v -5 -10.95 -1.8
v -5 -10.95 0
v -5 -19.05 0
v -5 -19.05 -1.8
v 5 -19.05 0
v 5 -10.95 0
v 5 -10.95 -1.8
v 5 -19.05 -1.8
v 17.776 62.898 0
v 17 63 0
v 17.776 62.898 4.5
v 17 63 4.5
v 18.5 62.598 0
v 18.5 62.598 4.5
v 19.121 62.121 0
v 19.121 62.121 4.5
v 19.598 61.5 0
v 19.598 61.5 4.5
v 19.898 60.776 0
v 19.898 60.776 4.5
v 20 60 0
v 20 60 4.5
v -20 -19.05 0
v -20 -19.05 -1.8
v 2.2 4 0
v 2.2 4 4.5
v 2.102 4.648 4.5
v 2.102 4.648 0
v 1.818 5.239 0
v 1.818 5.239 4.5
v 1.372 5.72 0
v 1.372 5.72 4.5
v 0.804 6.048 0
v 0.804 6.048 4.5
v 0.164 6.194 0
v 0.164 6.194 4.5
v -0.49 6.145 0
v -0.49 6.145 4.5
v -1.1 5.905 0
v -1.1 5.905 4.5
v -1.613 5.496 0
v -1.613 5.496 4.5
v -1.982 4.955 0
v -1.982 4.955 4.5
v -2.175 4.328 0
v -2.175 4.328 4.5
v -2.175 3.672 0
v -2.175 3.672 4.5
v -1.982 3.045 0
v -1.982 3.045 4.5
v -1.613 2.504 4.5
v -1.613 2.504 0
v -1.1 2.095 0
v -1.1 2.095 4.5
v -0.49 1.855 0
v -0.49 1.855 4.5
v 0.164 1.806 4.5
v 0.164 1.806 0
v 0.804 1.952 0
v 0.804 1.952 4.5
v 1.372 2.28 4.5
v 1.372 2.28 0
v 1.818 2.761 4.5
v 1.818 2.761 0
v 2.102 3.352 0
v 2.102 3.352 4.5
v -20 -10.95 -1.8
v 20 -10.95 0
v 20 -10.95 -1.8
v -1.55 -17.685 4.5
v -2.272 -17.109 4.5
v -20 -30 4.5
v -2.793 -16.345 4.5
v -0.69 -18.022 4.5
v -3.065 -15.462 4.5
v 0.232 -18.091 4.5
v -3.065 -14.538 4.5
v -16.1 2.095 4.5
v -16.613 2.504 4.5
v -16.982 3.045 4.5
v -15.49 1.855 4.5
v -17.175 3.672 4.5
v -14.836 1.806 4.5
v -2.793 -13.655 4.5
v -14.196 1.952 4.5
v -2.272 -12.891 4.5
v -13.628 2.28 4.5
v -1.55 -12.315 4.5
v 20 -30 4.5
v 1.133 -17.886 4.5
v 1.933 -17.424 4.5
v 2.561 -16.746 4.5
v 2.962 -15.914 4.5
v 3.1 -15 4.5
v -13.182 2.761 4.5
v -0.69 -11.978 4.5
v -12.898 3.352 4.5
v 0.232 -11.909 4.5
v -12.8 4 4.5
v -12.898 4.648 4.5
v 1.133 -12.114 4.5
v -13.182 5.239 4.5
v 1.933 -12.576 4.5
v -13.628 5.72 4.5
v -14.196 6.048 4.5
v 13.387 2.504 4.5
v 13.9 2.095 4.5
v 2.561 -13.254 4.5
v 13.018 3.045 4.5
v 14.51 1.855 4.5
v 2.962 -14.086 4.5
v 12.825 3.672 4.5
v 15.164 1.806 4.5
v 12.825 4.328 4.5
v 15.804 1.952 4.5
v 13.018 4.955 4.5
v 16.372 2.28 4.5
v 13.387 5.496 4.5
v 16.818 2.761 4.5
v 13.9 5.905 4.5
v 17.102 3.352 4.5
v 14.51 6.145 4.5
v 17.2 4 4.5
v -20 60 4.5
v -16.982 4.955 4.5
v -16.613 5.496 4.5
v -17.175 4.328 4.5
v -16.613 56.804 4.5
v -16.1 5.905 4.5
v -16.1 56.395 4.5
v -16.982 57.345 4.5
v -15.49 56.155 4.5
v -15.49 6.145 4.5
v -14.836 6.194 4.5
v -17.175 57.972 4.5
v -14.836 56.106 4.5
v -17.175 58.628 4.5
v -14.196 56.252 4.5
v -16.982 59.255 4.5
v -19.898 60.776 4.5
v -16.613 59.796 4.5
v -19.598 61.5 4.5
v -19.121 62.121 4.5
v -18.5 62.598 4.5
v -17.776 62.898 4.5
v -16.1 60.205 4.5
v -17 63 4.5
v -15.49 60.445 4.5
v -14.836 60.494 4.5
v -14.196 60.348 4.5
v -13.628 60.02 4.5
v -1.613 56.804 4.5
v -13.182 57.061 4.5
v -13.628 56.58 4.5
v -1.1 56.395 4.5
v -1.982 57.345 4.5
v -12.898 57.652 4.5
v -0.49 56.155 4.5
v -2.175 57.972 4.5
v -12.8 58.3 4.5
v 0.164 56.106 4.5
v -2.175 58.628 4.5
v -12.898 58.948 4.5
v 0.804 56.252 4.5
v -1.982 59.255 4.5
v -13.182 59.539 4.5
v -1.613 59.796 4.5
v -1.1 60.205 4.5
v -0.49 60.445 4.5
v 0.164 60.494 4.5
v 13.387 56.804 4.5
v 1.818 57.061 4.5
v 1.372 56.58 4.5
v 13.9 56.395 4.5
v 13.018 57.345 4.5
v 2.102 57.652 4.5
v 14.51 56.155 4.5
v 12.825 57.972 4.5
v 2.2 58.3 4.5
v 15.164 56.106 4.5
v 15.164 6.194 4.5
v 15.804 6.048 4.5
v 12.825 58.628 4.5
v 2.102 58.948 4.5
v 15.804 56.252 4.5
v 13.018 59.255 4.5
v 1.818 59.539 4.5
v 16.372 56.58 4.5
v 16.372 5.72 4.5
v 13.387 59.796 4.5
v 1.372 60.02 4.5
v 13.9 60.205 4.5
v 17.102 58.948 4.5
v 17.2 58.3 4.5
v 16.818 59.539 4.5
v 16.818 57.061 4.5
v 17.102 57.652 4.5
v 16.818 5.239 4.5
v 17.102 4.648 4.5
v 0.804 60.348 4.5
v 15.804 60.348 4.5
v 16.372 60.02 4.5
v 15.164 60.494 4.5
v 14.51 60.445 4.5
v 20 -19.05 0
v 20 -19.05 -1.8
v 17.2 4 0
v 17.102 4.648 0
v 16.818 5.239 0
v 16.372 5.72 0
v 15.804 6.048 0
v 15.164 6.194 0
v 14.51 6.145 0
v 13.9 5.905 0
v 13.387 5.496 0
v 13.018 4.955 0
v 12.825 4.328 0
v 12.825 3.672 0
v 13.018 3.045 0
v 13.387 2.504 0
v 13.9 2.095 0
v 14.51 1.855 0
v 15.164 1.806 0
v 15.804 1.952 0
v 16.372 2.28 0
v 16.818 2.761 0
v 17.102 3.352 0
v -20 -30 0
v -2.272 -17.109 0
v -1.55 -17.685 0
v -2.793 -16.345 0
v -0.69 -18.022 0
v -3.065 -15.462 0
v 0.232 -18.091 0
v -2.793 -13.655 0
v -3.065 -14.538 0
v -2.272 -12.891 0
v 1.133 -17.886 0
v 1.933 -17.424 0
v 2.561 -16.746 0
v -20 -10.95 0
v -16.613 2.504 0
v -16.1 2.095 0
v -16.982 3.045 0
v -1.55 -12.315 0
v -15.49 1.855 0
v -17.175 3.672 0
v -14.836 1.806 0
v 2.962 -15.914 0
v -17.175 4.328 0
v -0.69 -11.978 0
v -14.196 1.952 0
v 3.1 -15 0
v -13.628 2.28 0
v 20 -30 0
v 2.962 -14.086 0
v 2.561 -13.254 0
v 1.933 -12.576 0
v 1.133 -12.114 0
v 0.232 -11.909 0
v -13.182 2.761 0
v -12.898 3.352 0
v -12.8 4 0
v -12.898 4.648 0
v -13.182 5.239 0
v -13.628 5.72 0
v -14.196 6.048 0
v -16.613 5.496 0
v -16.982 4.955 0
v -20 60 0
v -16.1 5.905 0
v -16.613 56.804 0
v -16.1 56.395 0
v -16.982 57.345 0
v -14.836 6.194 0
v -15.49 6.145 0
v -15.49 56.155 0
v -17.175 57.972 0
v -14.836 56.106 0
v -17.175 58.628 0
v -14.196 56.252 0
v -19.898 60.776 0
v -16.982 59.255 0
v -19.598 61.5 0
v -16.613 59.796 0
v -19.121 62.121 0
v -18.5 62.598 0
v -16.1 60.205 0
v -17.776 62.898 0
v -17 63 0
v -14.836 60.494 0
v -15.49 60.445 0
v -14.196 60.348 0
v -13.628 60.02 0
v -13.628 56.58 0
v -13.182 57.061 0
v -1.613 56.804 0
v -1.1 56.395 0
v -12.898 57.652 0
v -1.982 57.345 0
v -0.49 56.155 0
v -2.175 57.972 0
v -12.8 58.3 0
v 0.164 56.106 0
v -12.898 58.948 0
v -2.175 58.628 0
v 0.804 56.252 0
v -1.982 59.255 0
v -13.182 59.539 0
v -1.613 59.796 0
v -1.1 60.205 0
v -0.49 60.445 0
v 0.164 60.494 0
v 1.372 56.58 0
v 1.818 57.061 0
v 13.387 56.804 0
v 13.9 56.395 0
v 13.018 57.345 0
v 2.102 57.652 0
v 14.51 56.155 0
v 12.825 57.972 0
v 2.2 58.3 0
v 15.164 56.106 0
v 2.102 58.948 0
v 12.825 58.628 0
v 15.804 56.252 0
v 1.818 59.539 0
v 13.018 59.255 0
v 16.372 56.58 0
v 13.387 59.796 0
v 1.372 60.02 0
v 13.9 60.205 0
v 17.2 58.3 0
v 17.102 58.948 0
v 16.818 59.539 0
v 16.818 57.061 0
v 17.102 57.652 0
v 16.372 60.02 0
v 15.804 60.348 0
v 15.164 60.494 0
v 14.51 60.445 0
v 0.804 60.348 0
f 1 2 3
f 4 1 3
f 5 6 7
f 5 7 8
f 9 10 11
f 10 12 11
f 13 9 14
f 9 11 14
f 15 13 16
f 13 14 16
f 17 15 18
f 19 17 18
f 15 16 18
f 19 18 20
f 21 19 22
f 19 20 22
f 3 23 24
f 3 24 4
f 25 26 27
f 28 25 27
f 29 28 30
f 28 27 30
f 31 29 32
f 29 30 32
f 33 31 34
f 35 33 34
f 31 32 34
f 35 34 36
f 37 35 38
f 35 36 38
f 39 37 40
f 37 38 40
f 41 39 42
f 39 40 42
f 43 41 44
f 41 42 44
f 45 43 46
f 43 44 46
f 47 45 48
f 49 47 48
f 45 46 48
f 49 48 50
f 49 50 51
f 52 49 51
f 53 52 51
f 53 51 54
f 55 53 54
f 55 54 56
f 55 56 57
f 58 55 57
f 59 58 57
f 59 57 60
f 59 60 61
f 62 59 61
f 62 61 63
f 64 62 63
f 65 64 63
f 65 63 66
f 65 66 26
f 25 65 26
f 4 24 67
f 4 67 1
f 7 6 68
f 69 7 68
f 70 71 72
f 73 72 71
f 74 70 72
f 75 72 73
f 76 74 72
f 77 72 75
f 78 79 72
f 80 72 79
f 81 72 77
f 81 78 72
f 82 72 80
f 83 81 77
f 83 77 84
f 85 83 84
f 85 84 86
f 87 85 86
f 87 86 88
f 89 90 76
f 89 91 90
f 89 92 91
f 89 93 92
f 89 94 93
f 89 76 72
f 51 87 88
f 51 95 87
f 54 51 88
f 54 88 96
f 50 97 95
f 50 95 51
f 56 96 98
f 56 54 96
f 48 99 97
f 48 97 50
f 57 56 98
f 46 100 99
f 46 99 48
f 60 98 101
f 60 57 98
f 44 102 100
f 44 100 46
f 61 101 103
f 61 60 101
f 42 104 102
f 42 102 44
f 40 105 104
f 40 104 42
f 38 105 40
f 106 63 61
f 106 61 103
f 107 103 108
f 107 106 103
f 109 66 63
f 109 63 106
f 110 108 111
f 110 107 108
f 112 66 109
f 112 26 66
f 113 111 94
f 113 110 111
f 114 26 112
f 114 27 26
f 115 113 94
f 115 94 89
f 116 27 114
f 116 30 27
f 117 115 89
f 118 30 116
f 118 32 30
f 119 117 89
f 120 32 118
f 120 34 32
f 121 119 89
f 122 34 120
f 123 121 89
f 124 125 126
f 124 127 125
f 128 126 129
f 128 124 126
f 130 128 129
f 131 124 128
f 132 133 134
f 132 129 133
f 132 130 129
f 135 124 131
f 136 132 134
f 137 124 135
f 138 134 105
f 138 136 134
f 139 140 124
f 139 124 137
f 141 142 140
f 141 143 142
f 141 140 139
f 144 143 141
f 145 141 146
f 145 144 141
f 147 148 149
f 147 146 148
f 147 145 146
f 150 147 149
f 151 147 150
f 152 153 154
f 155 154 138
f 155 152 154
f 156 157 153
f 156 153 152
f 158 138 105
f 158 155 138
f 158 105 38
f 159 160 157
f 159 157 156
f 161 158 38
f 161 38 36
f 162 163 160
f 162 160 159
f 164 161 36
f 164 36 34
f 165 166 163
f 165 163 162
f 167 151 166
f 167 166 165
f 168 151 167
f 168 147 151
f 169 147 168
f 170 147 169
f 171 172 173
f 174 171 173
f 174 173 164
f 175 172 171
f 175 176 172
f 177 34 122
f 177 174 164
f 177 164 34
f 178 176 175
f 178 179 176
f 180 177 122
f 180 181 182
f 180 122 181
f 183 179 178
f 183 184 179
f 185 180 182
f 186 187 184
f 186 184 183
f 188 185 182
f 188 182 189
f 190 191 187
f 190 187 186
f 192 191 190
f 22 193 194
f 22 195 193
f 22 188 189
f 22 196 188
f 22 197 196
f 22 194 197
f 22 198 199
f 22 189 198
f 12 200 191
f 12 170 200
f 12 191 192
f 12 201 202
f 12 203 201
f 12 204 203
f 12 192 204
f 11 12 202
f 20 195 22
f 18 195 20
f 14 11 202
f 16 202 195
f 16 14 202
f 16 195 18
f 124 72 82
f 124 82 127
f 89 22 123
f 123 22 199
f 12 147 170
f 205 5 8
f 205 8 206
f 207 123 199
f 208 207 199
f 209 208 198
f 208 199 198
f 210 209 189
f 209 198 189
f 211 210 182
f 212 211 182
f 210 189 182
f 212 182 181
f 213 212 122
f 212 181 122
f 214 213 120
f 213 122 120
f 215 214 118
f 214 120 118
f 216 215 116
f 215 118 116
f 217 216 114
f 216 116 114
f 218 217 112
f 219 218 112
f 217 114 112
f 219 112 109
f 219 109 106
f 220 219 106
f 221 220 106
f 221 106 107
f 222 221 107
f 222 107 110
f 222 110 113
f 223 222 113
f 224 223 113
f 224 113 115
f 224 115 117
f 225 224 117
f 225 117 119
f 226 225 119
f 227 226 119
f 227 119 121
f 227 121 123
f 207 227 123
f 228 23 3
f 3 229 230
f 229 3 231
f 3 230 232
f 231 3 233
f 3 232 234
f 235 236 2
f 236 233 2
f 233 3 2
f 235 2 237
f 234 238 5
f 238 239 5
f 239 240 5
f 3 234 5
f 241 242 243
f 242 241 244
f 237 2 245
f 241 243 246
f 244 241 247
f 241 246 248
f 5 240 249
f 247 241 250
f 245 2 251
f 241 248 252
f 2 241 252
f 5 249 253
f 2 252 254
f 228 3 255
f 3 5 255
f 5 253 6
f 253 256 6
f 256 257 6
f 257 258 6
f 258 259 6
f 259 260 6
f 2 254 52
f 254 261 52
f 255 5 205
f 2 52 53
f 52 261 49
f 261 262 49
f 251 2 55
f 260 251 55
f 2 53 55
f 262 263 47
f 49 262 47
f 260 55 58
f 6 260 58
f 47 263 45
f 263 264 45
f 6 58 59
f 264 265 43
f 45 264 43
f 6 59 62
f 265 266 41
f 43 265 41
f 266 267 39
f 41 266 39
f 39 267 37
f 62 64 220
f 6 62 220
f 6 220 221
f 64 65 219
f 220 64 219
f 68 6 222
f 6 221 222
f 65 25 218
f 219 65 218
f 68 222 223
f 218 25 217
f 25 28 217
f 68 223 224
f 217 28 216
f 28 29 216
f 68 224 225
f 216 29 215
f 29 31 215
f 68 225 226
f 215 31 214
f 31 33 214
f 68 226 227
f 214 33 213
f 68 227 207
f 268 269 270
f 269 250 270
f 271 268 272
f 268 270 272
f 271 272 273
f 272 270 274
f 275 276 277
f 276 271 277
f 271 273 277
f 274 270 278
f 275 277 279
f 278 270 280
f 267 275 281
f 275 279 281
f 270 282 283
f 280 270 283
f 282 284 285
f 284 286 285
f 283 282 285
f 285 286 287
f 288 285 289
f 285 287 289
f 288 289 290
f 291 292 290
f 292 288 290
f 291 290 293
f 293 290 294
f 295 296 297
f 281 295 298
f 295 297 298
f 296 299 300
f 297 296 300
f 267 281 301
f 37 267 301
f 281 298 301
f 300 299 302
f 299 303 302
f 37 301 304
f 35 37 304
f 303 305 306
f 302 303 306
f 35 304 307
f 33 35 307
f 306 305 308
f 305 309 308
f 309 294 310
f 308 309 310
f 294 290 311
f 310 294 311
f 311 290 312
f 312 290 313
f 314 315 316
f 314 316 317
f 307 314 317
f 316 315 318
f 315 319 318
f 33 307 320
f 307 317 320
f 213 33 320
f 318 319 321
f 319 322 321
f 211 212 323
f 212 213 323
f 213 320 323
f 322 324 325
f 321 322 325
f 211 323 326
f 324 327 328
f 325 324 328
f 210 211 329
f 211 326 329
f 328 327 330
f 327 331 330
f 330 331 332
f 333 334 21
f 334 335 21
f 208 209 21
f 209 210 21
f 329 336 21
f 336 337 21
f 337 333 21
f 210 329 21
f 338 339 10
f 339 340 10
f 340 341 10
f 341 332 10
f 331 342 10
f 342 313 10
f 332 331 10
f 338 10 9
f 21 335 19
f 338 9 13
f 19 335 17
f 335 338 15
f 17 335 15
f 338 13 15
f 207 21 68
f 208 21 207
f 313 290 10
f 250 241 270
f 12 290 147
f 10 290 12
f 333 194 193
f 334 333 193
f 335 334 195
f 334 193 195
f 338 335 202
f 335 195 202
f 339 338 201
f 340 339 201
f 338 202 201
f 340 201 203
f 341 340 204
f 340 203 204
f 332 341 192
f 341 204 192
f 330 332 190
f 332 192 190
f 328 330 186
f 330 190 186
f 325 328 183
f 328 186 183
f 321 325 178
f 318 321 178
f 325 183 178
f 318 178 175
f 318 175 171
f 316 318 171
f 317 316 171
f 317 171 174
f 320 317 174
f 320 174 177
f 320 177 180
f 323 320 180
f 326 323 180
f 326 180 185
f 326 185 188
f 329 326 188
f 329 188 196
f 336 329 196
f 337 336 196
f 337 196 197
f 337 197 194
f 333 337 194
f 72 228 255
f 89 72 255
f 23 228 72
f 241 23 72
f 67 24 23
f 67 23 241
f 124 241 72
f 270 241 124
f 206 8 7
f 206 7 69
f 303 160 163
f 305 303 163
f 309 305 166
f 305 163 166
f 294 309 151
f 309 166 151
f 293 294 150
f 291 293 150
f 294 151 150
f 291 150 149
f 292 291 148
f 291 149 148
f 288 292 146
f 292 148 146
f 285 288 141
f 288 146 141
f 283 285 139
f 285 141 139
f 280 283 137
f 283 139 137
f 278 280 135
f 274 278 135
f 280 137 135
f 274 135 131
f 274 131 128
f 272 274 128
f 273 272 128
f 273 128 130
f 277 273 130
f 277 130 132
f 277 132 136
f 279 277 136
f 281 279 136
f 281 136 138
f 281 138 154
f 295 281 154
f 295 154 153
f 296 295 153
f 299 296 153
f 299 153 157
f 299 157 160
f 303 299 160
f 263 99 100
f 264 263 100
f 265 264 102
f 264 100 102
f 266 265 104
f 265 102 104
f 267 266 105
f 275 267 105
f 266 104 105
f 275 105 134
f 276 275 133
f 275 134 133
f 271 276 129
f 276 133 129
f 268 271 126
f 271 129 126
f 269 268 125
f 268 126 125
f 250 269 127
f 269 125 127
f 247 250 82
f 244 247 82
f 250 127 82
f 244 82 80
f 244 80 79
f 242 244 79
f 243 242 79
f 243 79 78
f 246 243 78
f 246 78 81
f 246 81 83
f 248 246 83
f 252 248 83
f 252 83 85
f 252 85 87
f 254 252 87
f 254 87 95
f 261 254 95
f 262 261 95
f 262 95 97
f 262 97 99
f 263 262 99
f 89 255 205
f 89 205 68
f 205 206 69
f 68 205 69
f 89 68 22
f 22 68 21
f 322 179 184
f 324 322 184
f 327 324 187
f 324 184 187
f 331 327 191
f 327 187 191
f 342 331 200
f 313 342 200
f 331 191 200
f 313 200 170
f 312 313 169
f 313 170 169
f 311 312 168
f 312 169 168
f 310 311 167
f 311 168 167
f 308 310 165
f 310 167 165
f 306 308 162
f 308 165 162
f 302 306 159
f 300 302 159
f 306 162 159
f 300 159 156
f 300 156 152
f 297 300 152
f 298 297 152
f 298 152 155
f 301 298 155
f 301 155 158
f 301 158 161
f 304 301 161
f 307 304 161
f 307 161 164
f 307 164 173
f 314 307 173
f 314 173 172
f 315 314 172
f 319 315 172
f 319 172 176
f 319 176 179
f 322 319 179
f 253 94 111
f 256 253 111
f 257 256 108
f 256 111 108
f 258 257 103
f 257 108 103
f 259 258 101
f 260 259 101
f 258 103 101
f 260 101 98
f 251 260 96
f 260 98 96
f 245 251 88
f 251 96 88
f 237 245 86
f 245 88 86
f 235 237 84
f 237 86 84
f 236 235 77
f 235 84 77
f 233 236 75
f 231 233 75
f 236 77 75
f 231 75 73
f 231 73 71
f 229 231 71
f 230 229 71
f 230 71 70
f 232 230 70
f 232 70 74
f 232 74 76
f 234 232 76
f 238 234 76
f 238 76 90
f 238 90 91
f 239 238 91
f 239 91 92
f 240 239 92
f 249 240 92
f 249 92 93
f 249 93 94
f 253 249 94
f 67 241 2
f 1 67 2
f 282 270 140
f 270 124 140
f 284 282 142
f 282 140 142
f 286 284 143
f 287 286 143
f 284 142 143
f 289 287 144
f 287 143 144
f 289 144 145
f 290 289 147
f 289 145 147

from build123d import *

# Parameters (mm, degrees)
SKETCH_W        = 40
SKETCH_H        = 93
PAD_DEPTH       = 4.5
SKETCH001_R     = 2.2
POCKET_DEPTH    = 5
FILLET_R        = 3
SKETCH002_R     = 3.1
POCKET001_DEPTH = 5
SKETCH003_W     = 15
SKETCH003_H     = 8.1
PAD001_DEPTH    = 1.8


with BuildPart() as part:
    # Sketch → Pad (new body)
    with BuildSketch(Plane.XY):
        with Locations((0, 16.5)):
            Rectangle(SKETCH_W, SKETCH_H)
    extrude(amount=PAD_DEPTH)

    # Sketch001 (on Face6 of Pad) → Pocket (cut)
    with BuildSketch(Plane.XY.offset(4.5)):
        with Locations((-15, 58.3)):
            Circle(SKETCH001_R)
        with Locations((15, 58.3)):
            Circle(SKETCH001_R)
        with Locations((0, 58.3)):
            Circle(SKETCH001_R)
        with Locations((-15, 4)):
            Circle(SKETCH001_R)
        with Locations((0, 4)):
            Circle(SKETCH001_R)
        with Locations((15, 4)):
            Circle(SKETCH001_R)
    extrude(amount=-POCKET_DEPTH, mode=Mode.SUBTRACT)

    # Fillet
    fillet_edges = [part.edges().sort_by_distance(p)[0] for p in [
        (20, 63, 2.25),
        (-20, 63, 2.25),
    ]]
    fillet(fillet_edges, radius=FILLET_R)

    # Sketch002 (on Face5 of Fillet) → Pocket001 (cut)
    with BuildSketch(Plane.XY.offset(4.5)):
        with Locations((0, -15)):
            Circle(SKETCH002_R)
    extrude(amount=-POCKET001_DEPTH, mode=Mode.SUBTRACT)

    # Sketch003 (on Face2 of Pocket001) → Pad001 (join)
    with BuildSketch(Plane(origin=(0, 0, 0), x_dir=(1, 0, 0), z_dir=(0, 0, -1))):
        with Locations((-12.5, 15)):
            Rectangle(SKETCH003_W, SKETCH003_H)
        with Locations((12.5, 15)):
            Rectangle(SKETCH003_W, SKETCH003_H)
    extrude(amount=PAD001_DEPTH)


solid = part.part
